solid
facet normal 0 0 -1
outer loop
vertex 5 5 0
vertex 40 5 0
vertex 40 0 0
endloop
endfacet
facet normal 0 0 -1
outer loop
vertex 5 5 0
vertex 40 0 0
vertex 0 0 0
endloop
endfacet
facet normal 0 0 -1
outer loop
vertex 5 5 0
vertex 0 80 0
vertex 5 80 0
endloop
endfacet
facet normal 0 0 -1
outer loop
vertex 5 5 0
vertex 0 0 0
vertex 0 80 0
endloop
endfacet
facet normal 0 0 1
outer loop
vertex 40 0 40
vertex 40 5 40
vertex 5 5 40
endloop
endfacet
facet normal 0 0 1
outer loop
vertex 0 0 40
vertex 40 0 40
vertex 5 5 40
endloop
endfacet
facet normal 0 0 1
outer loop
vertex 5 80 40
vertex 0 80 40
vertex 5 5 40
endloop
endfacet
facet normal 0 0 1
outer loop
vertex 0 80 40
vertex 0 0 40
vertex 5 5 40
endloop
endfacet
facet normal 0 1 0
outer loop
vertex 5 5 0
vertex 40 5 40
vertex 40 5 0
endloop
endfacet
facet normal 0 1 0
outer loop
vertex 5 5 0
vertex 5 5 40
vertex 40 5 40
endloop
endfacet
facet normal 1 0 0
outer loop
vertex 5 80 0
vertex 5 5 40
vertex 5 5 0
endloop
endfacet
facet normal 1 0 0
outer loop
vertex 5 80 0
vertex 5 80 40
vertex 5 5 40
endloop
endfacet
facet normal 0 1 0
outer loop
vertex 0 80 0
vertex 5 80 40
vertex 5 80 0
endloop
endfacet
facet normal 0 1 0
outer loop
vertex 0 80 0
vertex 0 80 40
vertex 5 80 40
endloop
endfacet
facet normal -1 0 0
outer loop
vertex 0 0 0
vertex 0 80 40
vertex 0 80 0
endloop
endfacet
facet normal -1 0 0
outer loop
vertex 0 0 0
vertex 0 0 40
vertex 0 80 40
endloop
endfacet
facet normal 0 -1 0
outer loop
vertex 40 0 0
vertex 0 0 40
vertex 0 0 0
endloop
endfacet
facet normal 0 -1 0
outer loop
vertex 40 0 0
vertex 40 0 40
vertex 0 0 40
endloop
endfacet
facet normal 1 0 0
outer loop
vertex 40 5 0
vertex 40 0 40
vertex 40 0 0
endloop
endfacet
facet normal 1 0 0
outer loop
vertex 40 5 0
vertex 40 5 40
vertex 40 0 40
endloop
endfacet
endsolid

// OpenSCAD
$fn = 32;

// ----------------------------------------------------------------------
// Structural section: angle 40 x 80 mm
// ----------------------------------------------------------------------

// --- parameters (mm) ---
sec_w = 40;               // leg width, X
sec_h = 80;               // leg height, Y
flange_t = 5;             // leg thickness
plate_t = 40;             // cut length, Z (extrusion height)

profile = [[0, 0], [40, 0], [40, 5], [5, 5], [5, 80], [0, 80]];  // primary outline, 6 points, counter clockwise

// --- the one profile operation ---
linear_extrude(height = plate_t) polygon(points = profile);
